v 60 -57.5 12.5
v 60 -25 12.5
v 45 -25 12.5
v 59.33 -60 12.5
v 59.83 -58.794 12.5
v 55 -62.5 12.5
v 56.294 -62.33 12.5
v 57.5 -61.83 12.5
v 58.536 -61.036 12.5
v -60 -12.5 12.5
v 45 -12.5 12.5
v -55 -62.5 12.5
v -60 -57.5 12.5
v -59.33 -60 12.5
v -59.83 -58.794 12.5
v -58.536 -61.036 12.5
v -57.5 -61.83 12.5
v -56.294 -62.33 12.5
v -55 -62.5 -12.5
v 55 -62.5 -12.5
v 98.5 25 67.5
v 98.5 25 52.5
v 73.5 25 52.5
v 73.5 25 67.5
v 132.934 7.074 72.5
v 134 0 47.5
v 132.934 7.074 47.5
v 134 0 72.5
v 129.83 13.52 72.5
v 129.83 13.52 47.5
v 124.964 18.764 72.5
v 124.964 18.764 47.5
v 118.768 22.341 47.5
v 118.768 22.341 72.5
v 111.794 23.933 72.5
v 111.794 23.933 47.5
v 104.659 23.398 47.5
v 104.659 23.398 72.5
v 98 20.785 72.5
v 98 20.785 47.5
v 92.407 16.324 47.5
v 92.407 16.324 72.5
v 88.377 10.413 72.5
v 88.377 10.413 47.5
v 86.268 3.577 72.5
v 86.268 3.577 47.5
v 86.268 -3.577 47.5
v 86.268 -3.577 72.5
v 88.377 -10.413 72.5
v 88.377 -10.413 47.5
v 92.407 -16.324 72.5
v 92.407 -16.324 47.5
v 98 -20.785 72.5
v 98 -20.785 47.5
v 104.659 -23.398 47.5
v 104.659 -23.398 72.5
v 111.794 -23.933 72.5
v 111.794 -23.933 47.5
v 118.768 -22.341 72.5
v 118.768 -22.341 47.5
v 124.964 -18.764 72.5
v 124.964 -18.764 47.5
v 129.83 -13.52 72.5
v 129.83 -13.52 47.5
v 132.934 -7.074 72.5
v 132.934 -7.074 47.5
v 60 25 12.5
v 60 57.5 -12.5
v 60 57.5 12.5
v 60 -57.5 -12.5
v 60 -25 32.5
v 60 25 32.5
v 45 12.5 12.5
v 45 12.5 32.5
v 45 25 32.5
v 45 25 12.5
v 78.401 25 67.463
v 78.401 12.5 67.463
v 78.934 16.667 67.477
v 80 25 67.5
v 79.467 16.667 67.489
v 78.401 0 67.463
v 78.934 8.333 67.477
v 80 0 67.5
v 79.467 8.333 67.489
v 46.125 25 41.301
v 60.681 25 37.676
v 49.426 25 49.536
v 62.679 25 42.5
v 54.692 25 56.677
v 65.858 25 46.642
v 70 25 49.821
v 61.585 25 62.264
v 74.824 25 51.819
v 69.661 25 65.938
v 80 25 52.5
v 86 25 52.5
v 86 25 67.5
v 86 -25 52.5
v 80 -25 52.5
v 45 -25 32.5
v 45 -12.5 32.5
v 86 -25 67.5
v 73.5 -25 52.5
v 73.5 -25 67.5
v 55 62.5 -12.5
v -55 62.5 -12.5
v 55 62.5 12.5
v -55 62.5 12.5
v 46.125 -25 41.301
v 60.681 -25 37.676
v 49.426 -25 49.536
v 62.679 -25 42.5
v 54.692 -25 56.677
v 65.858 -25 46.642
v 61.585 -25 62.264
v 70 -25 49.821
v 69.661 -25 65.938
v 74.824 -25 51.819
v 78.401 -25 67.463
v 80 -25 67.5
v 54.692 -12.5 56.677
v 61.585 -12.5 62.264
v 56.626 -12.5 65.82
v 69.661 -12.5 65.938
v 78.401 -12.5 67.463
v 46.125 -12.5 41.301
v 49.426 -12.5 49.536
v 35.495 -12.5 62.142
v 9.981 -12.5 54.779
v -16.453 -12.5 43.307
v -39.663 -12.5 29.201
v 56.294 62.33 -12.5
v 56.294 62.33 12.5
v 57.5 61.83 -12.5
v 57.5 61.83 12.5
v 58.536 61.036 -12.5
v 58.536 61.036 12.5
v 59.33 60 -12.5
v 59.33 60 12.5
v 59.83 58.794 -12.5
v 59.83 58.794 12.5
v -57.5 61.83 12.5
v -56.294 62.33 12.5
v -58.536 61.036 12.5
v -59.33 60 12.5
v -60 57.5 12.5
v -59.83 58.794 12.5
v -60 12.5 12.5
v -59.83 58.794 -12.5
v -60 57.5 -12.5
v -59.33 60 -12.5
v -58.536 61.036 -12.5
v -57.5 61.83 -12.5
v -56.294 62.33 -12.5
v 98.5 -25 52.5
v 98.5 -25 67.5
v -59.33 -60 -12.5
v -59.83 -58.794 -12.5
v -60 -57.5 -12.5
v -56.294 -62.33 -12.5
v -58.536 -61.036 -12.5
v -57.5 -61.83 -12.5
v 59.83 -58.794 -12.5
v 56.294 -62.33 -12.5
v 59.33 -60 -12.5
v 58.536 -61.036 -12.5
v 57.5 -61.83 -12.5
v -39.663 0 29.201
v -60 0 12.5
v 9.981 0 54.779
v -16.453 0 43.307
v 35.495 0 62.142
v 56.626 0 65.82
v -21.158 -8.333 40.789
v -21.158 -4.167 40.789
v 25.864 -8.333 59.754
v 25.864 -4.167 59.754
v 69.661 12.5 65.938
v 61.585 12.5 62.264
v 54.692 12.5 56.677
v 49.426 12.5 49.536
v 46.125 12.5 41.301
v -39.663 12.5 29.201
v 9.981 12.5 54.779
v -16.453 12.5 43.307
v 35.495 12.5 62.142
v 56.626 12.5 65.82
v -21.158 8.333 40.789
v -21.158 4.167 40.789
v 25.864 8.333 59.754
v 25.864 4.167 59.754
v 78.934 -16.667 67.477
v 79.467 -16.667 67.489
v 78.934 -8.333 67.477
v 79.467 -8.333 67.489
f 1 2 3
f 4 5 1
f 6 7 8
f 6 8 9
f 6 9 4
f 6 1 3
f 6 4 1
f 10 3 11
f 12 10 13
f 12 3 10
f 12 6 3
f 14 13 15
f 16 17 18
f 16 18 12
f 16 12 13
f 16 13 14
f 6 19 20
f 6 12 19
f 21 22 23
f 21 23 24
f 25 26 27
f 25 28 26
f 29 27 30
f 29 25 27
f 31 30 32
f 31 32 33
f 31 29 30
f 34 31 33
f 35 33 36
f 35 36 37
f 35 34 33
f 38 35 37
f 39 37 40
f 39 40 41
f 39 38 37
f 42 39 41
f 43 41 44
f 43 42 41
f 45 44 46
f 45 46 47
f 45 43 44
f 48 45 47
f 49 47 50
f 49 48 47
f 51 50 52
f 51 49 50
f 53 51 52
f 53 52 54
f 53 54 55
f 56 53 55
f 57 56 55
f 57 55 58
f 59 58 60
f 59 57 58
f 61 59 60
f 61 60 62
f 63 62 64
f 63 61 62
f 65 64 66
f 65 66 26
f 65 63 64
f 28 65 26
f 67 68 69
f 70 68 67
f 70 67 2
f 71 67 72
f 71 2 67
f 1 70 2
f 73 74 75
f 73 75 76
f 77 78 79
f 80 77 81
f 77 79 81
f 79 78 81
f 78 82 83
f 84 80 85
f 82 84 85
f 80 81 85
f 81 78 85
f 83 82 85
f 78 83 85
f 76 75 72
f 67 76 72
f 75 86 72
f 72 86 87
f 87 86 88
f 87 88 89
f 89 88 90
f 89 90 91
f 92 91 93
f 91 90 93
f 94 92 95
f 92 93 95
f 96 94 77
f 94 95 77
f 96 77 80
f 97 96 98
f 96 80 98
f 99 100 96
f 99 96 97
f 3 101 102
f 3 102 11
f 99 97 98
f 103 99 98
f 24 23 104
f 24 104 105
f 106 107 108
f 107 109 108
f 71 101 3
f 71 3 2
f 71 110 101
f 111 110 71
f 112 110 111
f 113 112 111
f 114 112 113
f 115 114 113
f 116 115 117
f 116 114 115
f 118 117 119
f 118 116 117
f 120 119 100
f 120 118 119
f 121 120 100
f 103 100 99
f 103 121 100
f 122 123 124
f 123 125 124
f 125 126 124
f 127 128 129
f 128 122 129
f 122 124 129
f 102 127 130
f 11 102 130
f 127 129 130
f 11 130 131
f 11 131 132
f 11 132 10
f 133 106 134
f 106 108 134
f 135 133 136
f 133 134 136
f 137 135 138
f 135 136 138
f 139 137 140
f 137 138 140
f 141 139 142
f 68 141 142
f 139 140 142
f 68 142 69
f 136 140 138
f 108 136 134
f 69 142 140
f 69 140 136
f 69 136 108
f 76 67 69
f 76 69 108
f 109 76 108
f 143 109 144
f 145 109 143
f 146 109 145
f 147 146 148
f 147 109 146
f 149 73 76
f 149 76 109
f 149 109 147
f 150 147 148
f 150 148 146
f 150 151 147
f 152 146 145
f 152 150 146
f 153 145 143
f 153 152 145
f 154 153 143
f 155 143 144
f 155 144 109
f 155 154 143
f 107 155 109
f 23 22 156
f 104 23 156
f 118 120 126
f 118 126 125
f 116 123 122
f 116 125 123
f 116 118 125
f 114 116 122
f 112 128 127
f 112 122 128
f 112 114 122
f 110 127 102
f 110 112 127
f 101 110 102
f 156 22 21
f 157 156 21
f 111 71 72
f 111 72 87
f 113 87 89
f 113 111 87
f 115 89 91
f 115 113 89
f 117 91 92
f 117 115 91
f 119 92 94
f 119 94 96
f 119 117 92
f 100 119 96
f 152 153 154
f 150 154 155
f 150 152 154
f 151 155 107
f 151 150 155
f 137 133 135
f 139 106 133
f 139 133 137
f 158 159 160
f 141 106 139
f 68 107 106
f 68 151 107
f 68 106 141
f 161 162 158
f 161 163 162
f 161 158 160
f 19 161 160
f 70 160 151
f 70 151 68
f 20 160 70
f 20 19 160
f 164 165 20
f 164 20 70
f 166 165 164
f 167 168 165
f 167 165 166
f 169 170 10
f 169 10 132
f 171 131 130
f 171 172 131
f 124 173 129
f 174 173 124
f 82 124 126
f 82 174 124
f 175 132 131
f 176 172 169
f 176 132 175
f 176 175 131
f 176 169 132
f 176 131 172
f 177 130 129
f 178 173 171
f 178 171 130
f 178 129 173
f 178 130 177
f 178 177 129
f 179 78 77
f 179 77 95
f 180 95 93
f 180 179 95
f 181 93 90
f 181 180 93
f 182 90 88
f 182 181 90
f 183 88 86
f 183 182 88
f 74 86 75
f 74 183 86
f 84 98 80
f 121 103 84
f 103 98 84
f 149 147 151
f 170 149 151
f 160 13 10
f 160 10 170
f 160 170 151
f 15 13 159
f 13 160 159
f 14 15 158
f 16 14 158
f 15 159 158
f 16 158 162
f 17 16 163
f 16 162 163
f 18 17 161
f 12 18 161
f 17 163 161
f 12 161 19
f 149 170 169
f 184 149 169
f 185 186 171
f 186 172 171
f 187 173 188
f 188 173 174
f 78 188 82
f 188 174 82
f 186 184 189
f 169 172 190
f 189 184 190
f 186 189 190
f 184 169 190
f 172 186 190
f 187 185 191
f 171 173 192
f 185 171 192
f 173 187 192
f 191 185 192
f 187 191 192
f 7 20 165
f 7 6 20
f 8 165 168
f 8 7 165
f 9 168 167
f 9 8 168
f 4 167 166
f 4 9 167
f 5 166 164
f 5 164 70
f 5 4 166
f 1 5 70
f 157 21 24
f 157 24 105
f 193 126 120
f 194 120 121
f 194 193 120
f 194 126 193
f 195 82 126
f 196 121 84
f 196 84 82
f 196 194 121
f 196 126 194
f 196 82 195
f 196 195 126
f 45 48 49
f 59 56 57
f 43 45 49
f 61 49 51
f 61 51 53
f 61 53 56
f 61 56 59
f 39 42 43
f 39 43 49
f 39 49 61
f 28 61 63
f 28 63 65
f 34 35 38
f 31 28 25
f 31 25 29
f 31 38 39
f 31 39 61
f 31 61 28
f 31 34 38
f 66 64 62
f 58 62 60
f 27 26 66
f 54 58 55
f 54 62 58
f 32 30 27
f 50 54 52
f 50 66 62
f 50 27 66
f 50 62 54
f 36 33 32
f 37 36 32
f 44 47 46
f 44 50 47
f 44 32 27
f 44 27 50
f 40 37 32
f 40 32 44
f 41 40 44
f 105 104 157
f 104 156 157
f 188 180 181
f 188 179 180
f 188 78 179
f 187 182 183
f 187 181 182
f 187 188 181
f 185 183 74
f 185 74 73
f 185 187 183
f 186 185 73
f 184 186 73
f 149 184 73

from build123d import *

# Parameters (mm, degrees)
F1_DEPTH = 62.5
F2_DEPTH = 25
F3_DEPTH = 12.5
F5_R     = 5
F6_DEPTH = 12.5


with BuildPart() as f1:
    # F0 (on Front) → F1 (new body, symmetric)
    with BuildSketch(Plane.XZ):
        Polygon((45, 12.5), (-60, 12.5), (-60, -12.5), (60, -12.5), (60, 12.5), align=None)
    extrude(amount=F1_DEPTH, both=True)

    # F0 (on Front) → F2 (join, symmetric)
    with BuildSketch(Plane.XZ):
        with BuildLine():
            Line((45, 32.5), (45, 12.5))
            Line((45, 12.5), (60, 12.5))
            Line((60, 12.5), (60, 32.5))
            ThreePointArc((60, 32.5), (65.8578643763, 46.6421356237), (80, 52.5))
            Line((80, 52.5), (86, 52.5))
            Line((86, 52.5), (86, 67.5))
            Line((86, 67.5), (80, 67.5))
            add(Edge.make_bspline(
                [(78.4011319241, 67.4634612256), (78.9336819399, 67.4775385762), (79.4666417132, 67.4897208838), (80, 67.5)],
                knots=[148.9580526978, 148.9580526978, 148.9580526978, 148.9580526978, 150.4160895649, 150.4160895649, 150.4160895649, 150.4160895649], degree=3))
            ThreePointArc((78.4011319241, 67.4634612256), (54.6922898837, 56.676844473), (45, 32.5))
        make_face()
    extrude(amount=F2_DEPTH, both=True)

    # F0 (on Front) → F3 (join, symmetric)
    with BuildSketch(Plane.XZ):
        with BuildLine():
            add(Edge.make_bspline(
                [(-60, 12.5), (-26.1363538837, 44.8078210398), (23.9939937369, 66.0252707529), (78.4011319241, 67.4634612256)],
                knots=[0, 0, 0, 0, 148.9580526978, 148.9580526978, 148.9580526978, 148.9580526978], degree=3))
            Line((-60, 12.5), (45, 12.5))
            Line((45, 12.5), (45, 32.5))
            ThreePointArc((45, 32.5), (54.6922898837, 56.676844473), (78.4011319241, 67.4634612256))
        make_face()
    extrude(amount=F3_DEPTH, both=True)

    # F5
    f5_edges = [f1.edges().sort_by_distance(p)[0] for p in [
        (-60, -62.5, 0),
        (60, -62.5, 0),
        (60, 62.5, 0),
        (-60, 62.5, 0),
    ]]
    fillet(f5_edges, radius=F5_R)


with BuildPart() as f4:
    # F0 (on Front) → F4 (revolve)
    with BuildSketch(Plane.XZ):
        Polygon((110, 72.5), (110, 67.5), (110, 52.5), (110, 47.5), (134, 47.5), (134, 72.5), align=None)
    revolve(axis=Axis((110, 0, 60), (0, 0, 1)))


with BuildPart() as f6:
    # F6 (new, symmetric): a face of the model
    f6_faces = [f1.part.faces().sort_by_distance(p)[0] for p in [
        (86, 0, 60),
    ]]
    extrude(f6_faces, amount=F6_DEPTH, both=True)


solid = Compound([f1.part, f4.part, f6.part])
